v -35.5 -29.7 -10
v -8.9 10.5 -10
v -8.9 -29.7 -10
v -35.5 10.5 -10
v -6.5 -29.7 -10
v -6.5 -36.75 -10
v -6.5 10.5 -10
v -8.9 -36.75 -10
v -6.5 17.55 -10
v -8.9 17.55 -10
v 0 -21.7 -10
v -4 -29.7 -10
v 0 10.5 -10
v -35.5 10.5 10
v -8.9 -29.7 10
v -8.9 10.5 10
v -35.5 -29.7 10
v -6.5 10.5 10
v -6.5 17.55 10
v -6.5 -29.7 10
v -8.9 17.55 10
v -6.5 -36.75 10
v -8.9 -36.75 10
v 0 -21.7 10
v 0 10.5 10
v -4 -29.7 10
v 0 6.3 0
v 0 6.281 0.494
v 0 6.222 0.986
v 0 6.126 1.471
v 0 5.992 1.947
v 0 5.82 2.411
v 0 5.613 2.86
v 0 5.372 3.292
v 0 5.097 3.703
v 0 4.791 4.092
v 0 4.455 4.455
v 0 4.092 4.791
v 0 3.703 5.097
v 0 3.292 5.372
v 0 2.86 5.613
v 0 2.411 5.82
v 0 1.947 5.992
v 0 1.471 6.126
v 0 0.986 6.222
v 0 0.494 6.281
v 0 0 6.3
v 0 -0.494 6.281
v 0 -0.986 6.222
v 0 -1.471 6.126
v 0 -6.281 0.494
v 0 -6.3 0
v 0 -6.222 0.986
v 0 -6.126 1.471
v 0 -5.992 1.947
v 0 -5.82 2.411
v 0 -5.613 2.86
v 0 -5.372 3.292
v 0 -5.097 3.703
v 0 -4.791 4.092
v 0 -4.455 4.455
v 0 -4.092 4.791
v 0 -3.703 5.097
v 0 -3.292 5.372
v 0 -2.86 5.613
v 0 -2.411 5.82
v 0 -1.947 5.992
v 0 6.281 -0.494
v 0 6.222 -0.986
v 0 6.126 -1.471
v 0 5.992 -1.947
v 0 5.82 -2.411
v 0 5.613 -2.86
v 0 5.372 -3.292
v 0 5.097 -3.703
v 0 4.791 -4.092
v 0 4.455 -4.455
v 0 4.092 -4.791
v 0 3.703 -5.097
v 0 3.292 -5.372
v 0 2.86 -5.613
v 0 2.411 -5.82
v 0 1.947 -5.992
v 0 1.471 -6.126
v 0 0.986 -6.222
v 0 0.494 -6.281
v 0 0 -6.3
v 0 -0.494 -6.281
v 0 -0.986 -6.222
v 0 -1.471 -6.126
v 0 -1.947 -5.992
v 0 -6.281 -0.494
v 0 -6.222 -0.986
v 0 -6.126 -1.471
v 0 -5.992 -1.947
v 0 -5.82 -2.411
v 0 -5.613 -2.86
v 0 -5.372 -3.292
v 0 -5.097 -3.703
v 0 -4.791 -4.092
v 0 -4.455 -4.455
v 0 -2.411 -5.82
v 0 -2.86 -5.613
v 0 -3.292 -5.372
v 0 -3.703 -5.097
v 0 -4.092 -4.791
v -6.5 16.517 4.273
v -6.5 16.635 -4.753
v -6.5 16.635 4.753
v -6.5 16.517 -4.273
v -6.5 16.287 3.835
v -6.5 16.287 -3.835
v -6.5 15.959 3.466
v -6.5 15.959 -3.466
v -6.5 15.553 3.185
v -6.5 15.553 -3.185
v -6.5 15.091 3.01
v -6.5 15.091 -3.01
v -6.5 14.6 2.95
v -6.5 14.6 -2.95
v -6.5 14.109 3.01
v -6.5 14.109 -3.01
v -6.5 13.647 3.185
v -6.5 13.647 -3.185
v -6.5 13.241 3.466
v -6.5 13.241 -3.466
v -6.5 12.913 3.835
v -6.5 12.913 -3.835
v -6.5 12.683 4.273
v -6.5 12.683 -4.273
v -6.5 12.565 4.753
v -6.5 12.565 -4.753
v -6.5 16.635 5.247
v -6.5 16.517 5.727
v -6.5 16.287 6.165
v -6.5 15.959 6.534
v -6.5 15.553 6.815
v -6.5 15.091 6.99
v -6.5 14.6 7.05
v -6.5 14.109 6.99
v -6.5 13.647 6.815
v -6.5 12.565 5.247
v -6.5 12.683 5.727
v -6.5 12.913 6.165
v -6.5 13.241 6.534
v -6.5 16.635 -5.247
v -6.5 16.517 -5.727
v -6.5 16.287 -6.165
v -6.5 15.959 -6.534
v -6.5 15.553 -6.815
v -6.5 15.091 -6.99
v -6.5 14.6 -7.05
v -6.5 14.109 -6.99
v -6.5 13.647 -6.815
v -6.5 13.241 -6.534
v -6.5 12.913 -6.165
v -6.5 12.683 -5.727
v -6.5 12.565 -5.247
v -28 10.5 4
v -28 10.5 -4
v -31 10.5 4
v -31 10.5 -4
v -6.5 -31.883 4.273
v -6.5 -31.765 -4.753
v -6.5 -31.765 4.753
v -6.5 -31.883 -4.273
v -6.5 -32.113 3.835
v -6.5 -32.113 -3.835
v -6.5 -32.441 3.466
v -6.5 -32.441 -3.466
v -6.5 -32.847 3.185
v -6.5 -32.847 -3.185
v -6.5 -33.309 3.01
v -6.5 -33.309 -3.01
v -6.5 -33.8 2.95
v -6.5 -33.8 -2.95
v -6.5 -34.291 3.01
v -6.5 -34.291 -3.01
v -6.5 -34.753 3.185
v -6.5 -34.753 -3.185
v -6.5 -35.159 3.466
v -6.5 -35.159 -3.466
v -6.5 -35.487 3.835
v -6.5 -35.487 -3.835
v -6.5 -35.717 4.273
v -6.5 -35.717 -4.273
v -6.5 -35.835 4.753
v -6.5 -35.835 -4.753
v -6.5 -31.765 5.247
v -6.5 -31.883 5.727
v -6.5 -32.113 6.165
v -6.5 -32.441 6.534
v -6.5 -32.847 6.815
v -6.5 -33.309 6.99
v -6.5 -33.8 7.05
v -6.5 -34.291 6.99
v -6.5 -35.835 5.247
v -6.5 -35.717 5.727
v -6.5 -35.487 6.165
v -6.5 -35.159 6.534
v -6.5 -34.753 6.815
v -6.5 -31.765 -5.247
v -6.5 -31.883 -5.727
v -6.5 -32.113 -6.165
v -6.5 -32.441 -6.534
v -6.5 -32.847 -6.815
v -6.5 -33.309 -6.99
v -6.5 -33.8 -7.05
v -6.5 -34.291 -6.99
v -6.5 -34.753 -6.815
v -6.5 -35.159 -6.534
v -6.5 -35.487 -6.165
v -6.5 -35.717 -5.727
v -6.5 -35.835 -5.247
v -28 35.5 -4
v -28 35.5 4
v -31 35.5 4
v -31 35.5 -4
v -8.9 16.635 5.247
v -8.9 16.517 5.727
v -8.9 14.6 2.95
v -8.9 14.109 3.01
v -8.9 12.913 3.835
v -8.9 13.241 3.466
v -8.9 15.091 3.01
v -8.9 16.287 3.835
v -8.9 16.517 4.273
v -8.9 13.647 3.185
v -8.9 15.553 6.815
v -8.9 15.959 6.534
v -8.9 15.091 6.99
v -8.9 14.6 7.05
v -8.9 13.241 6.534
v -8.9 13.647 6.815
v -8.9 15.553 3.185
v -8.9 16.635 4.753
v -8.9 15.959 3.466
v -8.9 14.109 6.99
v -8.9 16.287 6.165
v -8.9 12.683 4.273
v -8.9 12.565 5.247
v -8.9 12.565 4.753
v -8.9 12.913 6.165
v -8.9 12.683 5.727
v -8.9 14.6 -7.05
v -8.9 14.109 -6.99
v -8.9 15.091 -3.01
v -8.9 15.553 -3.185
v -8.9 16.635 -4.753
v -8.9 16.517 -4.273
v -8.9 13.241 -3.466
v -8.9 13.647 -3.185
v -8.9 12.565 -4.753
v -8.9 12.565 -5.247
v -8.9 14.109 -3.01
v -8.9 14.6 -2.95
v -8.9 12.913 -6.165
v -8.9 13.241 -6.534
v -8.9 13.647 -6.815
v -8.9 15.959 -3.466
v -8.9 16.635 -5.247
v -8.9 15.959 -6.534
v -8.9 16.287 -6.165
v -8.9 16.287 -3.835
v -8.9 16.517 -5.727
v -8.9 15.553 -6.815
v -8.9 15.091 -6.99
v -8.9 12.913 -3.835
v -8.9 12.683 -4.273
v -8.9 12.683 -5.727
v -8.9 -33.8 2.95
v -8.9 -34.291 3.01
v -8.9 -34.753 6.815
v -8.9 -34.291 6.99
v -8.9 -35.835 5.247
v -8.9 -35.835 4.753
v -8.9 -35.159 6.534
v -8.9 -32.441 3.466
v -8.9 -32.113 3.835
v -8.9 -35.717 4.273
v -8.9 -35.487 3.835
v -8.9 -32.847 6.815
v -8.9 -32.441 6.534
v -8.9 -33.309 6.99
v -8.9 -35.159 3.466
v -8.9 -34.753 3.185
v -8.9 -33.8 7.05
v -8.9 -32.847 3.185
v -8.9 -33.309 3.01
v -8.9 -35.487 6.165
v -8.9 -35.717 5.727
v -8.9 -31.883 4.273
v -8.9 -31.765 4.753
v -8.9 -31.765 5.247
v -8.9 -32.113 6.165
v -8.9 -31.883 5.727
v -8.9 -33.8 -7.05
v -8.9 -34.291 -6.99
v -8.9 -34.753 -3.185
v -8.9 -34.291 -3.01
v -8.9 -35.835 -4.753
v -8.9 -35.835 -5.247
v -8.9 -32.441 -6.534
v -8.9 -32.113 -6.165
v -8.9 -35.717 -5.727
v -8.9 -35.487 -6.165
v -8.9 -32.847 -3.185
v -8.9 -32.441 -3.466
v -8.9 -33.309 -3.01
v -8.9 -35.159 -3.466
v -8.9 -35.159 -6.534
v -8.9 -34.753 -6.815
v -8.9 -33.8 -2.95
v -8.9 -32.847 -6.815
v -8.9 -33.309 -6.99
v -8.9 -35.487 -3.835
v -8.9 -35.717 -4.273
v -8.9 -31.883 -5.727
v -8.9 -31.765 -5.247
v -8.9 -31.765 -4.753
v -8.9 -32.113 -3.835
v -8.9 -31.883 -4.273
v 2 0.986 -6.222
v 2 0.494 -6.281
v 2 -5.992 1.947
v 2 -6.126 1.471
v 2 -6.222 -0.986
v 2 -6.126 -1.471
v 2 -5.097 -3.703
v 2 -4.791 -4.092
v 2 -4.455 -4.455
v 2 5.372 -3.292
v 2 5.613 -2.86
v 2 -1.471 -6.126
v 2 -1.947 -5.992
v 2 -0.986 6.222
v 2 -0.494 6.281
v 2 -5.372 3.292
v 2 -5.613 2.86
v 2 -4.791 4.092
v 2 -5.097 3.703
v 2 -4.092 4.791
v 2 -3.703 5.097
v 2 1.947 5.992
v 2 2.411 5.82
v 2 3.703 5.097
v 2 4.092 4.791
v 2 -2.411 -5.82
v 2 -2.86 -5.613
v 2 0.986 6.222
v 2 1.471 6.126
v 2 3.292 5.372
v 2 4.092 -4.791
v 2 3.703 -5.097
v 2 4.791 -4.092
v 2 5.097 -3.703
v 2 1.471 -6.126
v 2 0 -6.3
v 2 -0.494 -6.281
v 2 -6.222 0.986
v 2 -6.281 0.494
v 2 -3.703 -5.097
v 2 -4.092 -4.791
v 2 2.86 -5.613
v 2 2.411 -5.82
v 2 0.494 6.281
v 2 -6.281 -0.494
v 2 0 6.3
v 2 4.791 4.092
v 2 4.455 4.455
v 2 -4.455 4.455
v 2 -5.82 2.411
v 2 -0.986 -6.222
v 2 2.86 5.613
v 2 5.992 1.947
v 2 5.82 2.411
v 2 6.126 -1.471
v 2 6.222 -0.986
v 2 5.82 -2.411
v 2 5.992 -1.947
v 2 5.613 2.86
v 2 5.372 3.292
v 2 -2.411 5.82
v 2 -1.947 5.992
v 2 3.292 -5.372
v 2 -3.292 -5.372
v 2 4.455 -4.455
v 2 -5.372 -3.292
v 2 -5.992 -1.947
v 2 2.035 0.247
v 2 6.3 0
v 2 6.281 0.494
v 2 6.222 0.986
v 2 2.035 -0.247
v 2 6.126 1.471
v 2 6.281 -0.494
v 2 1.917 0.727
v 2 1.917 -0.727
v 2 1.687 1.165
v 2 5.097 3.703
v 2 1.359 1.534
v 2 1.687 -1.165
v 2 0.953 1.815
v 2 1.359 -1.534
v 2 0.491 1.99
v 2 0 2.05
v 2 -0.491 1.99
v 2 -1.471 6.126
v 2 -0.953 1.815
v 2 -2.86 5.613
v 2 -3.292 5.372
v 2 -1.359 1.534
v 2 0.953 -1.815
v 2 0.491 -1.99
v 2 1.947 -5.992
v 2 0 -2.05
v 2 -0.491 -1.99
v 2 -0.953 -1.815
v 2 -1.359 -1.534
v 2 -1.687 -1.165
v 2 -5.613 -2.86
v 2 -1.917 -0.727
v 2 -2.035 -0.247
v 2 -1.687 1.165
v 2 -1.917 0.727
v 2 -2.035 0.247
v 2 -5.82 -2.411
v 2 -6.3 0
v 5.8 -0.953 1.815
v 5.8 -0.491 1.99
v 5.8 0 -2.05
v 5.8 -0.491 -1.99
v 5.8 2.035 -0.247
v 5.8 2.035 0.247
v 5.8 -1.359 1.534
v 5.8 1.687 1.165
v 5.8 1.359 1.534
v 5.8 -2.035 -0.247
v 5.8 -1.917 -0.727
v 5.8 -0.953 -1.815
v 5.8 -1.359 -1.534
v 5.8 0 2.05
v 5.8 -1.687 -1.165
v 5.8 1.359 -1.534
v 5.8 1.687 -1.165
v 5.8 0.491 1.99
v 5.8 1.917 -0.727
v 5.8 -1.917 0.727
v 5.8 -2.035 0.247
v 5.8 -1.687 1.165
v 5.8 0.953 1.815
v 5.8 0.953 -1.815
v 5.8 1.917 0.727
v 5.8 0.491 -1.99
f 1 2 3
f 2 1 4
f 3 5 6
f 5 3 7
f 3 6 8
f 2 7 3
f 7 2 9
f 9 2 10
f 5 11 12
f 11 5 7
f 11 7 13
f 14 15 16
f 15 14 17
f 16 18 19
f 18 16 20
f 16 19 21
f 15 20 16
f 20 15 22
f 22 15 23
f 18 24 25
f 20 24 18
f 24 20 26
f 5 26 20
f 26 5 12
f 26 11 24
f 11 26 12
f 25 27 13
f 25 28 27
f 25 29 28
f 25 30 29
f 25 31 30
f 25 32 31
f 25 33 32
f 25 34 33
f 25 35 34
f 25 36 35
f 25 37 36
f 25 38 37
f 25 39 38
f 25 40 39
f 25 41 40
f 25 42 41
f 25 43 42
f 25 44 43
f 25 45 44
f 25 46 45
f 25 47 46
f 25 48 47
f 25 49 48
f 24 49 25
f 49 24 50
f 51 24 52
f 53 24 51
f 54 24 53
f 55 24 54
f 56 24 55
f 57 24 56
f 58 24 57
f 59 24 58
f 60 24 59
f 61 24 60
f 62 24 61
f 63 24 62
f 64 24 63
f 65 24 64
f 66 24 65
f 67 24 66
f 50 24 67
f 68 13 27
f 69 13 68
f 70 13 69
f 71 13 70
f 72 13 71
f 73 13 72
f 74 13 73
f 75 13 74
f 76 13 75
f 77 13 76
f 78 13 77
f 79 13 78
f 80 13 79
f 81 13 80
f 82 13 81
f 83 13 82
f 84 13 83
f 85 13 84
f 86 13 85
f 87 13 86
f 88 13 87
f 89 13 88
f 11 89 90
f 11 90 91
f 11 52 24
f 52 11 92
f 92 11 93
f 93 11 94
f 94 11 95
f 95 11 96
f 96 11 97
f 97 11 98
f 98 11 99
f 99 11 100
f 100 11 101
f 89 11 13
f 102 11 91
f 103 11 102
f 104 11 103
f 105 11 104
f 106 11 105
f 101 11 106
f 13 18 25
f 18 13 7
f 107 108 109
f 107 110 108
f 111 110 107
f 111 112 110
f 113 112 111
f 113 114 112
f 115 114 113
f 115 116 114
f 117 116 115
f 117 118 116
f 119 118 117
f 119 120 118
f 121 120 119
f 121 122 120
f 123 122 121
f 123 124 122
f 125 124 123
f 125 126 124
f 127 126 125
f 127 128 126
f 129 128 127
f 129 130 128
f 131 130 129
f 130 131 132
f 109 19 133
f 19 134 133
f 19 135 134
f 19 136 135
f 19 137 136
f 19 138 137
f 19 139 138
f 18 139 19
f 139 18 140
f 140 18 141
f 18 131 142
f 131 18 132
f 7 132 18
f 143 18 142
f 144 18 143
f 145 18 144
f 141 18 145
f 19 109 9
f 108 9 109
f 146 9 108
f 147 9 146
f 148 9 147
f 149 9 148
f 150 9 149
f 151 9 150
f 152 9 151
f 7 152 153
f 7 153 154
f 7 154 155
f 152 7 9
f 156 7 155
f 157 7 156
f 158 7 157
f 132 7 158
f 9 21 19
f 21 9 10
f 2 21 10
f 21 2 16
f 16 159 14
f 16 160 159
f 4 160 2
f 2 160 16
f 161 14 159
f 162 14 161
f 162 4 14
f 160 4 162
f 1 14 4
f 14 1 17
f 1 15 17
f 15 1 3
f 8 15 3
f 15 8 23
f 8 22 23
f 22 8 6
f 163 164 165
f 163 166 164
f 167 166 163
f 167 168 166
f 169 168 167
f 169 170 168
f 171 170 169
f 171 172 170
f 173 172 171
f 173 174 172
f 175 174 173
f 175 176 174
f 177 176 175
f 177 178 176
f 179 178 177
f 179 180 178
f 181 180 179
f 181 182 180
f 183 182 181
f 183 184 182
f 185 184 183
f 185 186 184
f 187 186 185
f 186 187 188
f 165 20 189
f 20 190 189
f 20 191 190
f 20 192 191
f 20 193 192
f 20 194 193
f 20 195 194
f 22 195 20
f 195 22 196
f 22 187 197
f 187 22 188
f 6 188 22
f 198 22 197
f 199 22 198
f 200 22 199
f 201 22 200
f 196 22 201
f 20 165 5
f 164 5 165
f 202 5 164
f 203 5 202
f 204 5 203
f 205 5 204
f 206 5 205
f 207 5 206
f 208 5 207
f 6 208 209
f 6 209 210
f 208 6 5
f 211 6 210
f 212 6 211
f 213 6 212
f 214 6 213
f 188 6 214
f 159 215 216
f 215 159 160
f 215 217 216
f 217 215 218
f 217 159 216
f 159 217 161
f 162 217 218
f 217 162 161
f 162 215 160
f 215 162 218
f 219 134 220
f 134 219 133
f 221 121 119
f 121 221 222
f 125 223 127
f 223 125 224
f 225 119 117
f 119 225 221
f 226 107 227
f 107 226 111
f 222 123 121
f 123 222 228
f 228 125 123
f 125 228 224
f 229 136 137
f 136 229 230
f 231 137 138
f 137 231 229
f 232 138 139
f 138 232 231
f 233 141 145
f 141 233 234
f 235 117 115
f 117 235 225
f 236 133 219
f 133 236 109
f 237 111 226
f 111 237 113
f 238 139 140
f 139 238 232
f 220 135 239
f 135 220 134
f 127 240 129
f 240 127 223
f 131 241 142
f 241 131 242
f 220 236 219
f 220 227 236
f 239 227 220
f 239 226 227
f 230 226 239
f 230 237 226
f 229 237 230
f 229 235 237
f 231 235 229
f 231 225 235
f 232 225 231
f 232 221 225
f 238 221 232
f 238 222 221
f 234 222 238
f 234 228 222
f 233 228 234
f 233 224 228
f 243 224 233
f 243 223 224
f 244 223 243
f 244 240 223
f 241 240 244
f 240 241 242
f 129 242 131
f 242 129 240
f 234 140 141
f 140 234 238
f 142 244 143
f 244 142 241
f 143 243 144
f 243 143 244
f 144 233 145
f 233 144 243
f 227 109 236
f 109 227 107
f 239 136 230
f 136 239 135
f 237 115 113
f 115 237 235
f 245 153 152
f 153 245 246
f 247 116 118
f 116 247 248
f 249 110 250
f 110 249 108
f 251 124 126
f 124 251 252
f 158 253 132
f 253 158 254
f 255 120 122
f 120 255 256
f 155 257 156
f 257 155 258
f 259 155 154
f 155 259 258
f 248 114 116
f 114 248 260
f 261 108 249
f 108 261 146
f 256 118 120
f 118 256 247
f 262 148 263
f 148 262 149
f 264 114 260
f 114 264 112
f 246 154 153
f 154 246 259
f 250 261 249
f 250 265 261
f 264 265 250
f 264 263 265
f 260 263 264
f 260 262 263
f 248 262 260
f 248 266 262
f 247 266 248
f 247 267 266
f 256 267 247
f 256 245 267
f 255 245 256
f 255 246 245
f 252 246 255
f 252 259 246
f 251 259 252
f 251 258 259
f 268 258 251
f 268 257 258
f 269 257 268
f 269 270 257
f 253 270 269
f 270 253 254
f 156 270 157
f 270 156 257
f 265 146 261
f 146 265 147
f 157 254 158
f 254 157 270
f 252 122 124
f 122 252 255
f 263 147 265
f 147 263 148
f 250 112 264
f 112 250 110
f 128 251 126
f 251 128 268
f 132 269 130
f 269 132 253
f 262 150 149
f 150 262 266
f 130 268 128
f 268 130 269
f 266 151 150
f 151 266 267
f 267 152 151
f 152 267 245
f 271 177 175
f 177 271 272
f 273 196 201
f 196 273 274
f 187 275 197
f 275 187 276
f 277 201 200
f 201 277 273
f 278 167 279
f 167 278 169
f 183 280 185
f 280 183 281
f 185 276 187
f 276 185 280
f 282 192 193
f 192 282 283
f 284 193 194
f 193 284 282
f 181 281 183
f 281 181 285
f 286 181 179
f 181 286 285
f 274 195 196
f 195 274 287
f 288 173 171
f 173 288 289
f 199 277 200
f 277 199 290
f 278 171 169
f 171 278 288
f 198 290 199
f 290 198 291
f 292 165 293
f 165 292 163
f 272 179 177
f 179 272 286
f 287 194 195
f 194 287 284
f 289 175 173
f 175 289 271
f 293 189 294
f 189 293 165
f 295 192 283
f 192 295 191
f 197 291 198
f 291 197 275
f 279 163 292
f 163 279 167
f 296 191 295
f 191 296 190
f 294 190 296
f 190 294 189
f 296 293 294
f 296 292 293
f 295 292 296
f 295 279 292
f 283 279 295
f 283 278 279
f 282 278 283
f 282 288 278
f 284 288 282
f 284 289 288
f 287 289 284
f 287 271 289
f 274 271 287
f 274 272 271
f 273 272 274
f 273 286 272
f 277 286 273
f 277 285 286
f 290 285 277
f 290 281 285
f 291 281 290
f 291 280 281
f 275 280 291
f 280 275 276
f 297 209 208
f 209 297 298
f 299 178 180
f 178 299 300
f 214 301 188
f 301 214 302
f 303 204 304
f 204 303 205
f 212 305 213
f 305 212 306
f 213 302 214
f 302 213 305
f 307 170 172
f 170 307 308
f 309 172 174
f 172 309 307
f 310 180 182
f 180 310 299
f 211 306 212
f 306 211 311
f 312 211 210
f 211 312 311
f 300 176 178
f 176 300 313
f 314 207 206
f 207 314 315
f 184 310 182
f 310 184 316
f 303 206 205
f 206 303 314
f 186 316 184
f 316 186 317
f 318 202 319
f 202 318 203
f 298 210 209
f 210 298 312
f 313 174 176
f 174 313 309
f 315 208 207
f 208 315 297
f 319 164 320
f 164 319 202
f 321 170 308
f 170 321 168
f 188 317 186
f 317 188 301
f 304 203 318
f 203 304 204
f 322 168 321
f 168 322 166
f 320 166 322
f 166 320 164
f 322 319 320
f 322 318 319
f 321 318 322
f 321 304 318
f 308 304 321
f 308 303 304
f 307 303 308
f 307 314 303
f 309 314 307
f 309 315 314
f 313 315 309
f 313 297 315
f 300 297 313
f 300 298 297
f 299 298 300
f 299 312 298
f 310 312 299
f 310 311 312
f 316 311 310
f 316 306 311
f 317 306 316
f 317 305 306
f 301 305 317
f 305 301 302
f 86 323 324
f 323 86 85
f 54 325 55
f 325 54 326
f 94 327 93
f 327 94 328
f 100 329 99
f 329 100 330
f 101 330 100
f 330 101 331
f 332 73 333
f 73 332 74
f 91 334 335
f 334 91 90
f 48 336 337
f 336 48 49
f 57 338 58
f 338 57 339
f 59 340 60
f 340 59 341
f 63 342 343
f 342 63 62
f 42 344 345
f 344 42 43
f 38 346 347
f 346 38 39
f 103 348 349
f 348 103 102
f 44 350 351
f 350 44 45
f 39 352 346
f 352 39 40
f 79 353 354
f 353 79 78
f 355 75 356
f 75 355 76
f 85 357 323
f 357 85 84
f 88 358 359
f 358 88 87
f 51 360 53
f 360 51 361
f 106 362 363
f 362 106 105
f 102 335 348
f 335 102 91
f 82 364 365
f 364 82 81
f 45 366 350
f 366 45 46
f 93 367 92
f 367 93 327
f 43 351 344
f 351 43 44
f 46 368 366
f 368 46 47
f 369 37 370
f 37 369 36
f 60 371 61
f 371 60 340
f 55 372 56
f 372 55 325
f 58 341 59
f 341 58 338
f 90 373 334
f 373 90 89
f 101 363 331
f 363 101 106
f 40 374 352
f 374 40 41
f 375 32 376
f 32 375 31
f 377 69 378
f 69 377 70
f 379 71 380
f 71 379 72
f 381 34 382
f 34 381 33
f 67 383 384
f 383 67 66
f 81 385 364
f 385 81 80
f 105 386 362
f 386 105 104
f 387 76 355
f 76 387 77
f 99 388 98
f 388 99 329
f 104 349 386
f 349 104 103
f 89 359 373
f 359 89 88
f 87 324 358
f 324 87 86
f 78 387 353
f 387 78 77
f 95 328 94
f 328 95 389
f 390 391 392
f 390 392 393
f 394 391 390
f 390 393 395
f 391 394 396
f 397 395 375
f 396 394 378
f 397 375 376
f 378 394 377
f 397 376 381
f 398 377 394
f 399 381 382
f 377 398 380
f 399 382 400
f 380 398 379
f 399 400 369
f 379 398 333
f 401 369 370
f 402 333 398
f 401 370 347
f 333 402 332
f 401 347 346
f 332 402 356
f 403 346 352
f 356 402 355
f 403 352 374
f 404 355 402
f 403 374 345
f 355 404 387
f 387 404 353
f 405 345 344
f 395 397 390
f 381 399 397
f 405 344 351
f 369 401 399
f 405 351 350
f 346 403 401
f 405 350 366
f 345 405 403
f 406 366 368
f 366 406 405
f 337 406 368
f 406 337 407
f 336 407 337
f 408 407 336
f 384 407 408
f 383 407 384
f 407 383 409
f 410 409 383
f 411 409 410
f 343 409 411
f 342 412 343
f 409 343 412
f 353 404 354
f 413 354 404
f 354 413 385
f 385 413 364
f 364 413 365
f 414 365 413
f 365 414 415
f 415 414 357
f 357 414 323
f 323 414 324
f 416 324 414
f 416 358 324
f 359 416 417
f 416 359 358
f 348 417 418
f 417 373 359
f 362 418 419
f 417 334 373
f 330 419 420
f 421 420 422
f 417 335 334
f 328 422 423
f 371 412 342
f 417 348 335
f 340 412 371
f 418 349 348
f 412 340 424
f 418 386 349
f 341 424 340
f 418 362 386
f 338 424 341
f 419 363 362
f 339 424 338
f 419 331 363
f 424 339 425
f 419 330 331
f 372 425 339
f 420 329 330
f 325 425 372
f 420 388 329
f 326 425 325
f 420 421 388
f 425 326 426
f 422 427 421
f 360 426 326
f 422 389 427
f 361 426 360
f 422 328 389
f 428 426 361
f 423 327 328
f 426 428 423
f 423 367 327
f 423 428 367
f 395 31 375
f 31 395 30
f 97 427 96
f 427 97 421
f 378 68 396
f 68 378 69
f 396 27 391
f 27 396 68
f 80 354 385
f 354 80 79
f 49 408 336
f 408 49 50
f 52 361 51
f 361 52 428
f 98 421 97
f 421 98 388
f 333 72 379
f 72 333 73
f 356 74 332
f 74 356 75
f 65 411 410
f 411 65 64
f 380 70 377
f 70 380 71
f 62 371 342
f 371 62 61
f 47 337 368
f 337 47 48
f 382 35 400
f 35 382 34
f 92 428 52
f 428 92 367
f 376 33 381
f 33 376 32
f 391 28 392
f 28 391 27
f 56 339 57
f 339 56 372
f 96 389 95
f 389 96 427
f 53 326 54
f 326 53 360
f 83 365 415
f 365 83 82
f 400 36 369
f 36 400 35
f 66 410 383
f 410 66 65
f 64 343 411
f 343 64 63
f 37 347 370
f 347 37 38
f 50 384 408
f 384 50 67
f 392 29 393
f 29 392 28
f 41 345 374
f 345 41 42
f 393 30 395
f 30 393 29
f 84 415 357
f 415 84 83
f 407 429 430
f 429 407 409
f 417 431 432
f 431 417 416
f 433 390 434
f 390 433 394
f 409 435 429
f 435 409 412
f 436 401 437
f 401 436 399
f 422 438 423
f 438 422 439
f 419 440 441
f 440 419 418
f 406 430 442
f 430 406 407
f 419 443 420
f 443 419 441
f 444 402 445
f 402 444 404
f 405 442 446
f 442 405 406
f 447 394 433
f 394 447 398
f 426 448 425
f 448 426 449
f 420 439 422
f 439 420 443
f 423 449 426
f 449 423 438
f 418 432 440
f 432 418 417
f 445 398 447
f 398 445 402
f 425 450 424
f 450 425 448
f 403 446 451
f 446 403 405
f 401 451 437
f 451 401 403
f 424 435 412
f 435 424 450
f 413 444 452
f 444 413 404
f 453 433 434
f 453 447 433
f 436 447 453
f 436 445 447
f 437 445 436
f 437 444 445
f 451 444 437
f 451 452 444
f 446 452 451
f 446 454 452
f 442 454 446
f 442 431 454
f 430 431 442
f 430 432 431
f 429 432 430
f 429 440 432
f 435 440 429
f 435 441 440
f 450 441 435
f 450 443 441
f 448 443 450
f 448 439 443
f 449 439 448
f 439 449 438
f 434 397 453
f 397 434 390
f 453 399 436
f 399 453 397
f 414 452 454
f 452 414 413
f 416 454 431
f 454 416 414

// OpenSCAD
//Use polygon and linear extrude
//The origin is placed at the root of the axel in XY


//HS422 dimensions measured with caliper
//X axis
//Total height of case from base to top of gearbox
Lx_case = 35.5;
//Measure from base to top of bearing of axel
Lx_case_to_bearing = 37.5;
//Add total height with axel
Lx_case_and_axel = 41.3;
//Height of the flanges
Lx_flange_thickness = 2.4;

//Measure position of the flanges from bottom and top
Lx_base_to_flange = 29.5;
Lx_flange_to_top = 9.4;


//Length of the cable stub to attach to the model
Lx_length_cable = 25.0;

//Lx_butt = (16.4+0.0);
//Lx_body_flange_gearbox = 23.0;


//Y axis
Ly_butt = 40.2;
//Distance between holes measured from the inside, need to add diameter
Ly_hole_interaxis_inner = 44.3;
Ly_flange = 54.3;
Ly_height_cable = 3.0;
//How much a flange extends from the body
Ly_flange_extends = (Ly_flange-Ly_butt)/2;
//Axel offset from top of servo
Ly_top_to_axel = 10.5;

//Z axis
Lz_depth = 20.0;
//I have four holes in a 2X2 configuration, this is vertical stacking
Lz_hole_interaxis = 10.0;

Lz_width_cable = 8.0;

//There is an indent on the bottom side of the gearbox, it's very servo dependent
Lr_indent = 8.0;

//Lz_depth_gearbox = 4.3;
//Diameters
//Holes in the flange
D_hole_diameter = 4.1;
//Servo Axel
D_axel = 5.9;
//Diameter of the bearing at the base of the axel
D_bearing = 12.6;

//Position of the flange from the base
Lx_flange_base = (Lx_base_to_flange -Lx_flange_thickness)/2 + (Lx_case -Lx_flange_to_top)/2;


Ly_hole_interaxis = Ly_hole_interaxis_inner +D_hole_diameter; 

module HS422()
{
	//Create the outline of the base
	aan_points =
	[
		//Top left corner
        [0, 0],
		//Top flange
        [Lx_flange_base, 0],
		[Lx_flange_base, Ly_flange_extends],
		[Lx_flange_base+Lx_flange_thickness, Ly_flange_extends],
		[Lx_flange_base+Lx_flange_thickness, 0],
		//Top right corner
		[Lx_case, 0],
		//Bottom right corner and indent
		[Lx_case, -Ly_butt+Lr_indent],
		[Lx_case-Lr_indent/2, -Ly_butt],
		//Bottom Flange
		[Lx_flange_base+Lx_flange_thickness, -Ly_butt],
		[Lx_flange_base+Lx_flange_thickness, -Ly_butt-Ly_flange_extends],
		[Lx_flange_base, -Ly_butt-Ly_flange_extends],
		[Lx_flange_base, -Ly_butt],
		//Bottom left corner
		[0, -Ly_butt],
    ];
	//Build the geometry, translate it so the axel is in the origin
	translate([-Lx_case,Ly_top_to_axel,-Lz_depth/2])
	color("gray")
	difference()
	{
		union()
		{
			//Body of the servo
			linear_extrude(Lz_depth)
				polygon(aan_points);
			//Cable stub
			translate([6,0,Lz_depth/2])
			rotate([90,0,180])
				linear_extrude(Lx_length_cable)
				square([Ly_height_cable, Lz_width_cable],center=true);

		}
		union()
		{
			//Top Top hole
			translate([Lx_flange_base,(Ly_hole_interaxis-Ly_butt)/2,Lz_depth/2+Lz_hole_interaxis/2])
			rotate([0,90,0])
			linear_extrude(Lx_flange_thickness)
			circle(d=D_hole_diameter,$fa=0.5,$fs=0.5);
			//Top Bottom hole
			translate([Lx_flange_base,(Ly_hole_interaxis-Ly_butt)/2,Lz_depth/2-Lz_hole_interaxis/2])
			rotate([0,90,0])
			linear_extrude(Lx_flange_thickness)
			circle(d=D_hole_diameter,$fa=0.5,$fs=0.5);

			//Bottom Top Hole
			translate([Lx_flange_base,-Ly_hole_interaxis+(Ly_hole_interaxis-Ly_butt)/2,Lz_depth/2+Lz_hole_interaxis/2])
			rotate([0,90,0])
			linear_extrude(Lx_flange_thickness)
			circle(d=D_hole_diameter,$fa=0.5,$fs=0.5);
			//Bottom Bottom Hole
			translate([Lx_flange_base,-Ly_hole_interaxis+(Ly_hole_interaxis-Ly_butt)/2,Lz_depth/2-Lz_hole_interaxis/2])
			rotate([0,90,0])
			linear_extrude(Lx_flange_thickness)
			circle(d=D_hole_diameter,$fa=0.5,$fs=0.5);

		}
	}
	//add servo bearing at base of axel

	//Add servo axel in the origin
	color("red")
	rotate([0,90,0])
	linear_extrude(Lx_case_to_bearing-Lx_case)
	circle(d=D_bearing,$fa=0.5,$fs=0.5);

	//Add servo axel in the origin
	color("red")
	rotate([0,90,0])
	linear_extrude(Lx_case_and_axel-Lx_case)
	circle(d=D_hole_diameter,$fa=0.5,$fs=0.5);
}

//Show the model
HS422();
